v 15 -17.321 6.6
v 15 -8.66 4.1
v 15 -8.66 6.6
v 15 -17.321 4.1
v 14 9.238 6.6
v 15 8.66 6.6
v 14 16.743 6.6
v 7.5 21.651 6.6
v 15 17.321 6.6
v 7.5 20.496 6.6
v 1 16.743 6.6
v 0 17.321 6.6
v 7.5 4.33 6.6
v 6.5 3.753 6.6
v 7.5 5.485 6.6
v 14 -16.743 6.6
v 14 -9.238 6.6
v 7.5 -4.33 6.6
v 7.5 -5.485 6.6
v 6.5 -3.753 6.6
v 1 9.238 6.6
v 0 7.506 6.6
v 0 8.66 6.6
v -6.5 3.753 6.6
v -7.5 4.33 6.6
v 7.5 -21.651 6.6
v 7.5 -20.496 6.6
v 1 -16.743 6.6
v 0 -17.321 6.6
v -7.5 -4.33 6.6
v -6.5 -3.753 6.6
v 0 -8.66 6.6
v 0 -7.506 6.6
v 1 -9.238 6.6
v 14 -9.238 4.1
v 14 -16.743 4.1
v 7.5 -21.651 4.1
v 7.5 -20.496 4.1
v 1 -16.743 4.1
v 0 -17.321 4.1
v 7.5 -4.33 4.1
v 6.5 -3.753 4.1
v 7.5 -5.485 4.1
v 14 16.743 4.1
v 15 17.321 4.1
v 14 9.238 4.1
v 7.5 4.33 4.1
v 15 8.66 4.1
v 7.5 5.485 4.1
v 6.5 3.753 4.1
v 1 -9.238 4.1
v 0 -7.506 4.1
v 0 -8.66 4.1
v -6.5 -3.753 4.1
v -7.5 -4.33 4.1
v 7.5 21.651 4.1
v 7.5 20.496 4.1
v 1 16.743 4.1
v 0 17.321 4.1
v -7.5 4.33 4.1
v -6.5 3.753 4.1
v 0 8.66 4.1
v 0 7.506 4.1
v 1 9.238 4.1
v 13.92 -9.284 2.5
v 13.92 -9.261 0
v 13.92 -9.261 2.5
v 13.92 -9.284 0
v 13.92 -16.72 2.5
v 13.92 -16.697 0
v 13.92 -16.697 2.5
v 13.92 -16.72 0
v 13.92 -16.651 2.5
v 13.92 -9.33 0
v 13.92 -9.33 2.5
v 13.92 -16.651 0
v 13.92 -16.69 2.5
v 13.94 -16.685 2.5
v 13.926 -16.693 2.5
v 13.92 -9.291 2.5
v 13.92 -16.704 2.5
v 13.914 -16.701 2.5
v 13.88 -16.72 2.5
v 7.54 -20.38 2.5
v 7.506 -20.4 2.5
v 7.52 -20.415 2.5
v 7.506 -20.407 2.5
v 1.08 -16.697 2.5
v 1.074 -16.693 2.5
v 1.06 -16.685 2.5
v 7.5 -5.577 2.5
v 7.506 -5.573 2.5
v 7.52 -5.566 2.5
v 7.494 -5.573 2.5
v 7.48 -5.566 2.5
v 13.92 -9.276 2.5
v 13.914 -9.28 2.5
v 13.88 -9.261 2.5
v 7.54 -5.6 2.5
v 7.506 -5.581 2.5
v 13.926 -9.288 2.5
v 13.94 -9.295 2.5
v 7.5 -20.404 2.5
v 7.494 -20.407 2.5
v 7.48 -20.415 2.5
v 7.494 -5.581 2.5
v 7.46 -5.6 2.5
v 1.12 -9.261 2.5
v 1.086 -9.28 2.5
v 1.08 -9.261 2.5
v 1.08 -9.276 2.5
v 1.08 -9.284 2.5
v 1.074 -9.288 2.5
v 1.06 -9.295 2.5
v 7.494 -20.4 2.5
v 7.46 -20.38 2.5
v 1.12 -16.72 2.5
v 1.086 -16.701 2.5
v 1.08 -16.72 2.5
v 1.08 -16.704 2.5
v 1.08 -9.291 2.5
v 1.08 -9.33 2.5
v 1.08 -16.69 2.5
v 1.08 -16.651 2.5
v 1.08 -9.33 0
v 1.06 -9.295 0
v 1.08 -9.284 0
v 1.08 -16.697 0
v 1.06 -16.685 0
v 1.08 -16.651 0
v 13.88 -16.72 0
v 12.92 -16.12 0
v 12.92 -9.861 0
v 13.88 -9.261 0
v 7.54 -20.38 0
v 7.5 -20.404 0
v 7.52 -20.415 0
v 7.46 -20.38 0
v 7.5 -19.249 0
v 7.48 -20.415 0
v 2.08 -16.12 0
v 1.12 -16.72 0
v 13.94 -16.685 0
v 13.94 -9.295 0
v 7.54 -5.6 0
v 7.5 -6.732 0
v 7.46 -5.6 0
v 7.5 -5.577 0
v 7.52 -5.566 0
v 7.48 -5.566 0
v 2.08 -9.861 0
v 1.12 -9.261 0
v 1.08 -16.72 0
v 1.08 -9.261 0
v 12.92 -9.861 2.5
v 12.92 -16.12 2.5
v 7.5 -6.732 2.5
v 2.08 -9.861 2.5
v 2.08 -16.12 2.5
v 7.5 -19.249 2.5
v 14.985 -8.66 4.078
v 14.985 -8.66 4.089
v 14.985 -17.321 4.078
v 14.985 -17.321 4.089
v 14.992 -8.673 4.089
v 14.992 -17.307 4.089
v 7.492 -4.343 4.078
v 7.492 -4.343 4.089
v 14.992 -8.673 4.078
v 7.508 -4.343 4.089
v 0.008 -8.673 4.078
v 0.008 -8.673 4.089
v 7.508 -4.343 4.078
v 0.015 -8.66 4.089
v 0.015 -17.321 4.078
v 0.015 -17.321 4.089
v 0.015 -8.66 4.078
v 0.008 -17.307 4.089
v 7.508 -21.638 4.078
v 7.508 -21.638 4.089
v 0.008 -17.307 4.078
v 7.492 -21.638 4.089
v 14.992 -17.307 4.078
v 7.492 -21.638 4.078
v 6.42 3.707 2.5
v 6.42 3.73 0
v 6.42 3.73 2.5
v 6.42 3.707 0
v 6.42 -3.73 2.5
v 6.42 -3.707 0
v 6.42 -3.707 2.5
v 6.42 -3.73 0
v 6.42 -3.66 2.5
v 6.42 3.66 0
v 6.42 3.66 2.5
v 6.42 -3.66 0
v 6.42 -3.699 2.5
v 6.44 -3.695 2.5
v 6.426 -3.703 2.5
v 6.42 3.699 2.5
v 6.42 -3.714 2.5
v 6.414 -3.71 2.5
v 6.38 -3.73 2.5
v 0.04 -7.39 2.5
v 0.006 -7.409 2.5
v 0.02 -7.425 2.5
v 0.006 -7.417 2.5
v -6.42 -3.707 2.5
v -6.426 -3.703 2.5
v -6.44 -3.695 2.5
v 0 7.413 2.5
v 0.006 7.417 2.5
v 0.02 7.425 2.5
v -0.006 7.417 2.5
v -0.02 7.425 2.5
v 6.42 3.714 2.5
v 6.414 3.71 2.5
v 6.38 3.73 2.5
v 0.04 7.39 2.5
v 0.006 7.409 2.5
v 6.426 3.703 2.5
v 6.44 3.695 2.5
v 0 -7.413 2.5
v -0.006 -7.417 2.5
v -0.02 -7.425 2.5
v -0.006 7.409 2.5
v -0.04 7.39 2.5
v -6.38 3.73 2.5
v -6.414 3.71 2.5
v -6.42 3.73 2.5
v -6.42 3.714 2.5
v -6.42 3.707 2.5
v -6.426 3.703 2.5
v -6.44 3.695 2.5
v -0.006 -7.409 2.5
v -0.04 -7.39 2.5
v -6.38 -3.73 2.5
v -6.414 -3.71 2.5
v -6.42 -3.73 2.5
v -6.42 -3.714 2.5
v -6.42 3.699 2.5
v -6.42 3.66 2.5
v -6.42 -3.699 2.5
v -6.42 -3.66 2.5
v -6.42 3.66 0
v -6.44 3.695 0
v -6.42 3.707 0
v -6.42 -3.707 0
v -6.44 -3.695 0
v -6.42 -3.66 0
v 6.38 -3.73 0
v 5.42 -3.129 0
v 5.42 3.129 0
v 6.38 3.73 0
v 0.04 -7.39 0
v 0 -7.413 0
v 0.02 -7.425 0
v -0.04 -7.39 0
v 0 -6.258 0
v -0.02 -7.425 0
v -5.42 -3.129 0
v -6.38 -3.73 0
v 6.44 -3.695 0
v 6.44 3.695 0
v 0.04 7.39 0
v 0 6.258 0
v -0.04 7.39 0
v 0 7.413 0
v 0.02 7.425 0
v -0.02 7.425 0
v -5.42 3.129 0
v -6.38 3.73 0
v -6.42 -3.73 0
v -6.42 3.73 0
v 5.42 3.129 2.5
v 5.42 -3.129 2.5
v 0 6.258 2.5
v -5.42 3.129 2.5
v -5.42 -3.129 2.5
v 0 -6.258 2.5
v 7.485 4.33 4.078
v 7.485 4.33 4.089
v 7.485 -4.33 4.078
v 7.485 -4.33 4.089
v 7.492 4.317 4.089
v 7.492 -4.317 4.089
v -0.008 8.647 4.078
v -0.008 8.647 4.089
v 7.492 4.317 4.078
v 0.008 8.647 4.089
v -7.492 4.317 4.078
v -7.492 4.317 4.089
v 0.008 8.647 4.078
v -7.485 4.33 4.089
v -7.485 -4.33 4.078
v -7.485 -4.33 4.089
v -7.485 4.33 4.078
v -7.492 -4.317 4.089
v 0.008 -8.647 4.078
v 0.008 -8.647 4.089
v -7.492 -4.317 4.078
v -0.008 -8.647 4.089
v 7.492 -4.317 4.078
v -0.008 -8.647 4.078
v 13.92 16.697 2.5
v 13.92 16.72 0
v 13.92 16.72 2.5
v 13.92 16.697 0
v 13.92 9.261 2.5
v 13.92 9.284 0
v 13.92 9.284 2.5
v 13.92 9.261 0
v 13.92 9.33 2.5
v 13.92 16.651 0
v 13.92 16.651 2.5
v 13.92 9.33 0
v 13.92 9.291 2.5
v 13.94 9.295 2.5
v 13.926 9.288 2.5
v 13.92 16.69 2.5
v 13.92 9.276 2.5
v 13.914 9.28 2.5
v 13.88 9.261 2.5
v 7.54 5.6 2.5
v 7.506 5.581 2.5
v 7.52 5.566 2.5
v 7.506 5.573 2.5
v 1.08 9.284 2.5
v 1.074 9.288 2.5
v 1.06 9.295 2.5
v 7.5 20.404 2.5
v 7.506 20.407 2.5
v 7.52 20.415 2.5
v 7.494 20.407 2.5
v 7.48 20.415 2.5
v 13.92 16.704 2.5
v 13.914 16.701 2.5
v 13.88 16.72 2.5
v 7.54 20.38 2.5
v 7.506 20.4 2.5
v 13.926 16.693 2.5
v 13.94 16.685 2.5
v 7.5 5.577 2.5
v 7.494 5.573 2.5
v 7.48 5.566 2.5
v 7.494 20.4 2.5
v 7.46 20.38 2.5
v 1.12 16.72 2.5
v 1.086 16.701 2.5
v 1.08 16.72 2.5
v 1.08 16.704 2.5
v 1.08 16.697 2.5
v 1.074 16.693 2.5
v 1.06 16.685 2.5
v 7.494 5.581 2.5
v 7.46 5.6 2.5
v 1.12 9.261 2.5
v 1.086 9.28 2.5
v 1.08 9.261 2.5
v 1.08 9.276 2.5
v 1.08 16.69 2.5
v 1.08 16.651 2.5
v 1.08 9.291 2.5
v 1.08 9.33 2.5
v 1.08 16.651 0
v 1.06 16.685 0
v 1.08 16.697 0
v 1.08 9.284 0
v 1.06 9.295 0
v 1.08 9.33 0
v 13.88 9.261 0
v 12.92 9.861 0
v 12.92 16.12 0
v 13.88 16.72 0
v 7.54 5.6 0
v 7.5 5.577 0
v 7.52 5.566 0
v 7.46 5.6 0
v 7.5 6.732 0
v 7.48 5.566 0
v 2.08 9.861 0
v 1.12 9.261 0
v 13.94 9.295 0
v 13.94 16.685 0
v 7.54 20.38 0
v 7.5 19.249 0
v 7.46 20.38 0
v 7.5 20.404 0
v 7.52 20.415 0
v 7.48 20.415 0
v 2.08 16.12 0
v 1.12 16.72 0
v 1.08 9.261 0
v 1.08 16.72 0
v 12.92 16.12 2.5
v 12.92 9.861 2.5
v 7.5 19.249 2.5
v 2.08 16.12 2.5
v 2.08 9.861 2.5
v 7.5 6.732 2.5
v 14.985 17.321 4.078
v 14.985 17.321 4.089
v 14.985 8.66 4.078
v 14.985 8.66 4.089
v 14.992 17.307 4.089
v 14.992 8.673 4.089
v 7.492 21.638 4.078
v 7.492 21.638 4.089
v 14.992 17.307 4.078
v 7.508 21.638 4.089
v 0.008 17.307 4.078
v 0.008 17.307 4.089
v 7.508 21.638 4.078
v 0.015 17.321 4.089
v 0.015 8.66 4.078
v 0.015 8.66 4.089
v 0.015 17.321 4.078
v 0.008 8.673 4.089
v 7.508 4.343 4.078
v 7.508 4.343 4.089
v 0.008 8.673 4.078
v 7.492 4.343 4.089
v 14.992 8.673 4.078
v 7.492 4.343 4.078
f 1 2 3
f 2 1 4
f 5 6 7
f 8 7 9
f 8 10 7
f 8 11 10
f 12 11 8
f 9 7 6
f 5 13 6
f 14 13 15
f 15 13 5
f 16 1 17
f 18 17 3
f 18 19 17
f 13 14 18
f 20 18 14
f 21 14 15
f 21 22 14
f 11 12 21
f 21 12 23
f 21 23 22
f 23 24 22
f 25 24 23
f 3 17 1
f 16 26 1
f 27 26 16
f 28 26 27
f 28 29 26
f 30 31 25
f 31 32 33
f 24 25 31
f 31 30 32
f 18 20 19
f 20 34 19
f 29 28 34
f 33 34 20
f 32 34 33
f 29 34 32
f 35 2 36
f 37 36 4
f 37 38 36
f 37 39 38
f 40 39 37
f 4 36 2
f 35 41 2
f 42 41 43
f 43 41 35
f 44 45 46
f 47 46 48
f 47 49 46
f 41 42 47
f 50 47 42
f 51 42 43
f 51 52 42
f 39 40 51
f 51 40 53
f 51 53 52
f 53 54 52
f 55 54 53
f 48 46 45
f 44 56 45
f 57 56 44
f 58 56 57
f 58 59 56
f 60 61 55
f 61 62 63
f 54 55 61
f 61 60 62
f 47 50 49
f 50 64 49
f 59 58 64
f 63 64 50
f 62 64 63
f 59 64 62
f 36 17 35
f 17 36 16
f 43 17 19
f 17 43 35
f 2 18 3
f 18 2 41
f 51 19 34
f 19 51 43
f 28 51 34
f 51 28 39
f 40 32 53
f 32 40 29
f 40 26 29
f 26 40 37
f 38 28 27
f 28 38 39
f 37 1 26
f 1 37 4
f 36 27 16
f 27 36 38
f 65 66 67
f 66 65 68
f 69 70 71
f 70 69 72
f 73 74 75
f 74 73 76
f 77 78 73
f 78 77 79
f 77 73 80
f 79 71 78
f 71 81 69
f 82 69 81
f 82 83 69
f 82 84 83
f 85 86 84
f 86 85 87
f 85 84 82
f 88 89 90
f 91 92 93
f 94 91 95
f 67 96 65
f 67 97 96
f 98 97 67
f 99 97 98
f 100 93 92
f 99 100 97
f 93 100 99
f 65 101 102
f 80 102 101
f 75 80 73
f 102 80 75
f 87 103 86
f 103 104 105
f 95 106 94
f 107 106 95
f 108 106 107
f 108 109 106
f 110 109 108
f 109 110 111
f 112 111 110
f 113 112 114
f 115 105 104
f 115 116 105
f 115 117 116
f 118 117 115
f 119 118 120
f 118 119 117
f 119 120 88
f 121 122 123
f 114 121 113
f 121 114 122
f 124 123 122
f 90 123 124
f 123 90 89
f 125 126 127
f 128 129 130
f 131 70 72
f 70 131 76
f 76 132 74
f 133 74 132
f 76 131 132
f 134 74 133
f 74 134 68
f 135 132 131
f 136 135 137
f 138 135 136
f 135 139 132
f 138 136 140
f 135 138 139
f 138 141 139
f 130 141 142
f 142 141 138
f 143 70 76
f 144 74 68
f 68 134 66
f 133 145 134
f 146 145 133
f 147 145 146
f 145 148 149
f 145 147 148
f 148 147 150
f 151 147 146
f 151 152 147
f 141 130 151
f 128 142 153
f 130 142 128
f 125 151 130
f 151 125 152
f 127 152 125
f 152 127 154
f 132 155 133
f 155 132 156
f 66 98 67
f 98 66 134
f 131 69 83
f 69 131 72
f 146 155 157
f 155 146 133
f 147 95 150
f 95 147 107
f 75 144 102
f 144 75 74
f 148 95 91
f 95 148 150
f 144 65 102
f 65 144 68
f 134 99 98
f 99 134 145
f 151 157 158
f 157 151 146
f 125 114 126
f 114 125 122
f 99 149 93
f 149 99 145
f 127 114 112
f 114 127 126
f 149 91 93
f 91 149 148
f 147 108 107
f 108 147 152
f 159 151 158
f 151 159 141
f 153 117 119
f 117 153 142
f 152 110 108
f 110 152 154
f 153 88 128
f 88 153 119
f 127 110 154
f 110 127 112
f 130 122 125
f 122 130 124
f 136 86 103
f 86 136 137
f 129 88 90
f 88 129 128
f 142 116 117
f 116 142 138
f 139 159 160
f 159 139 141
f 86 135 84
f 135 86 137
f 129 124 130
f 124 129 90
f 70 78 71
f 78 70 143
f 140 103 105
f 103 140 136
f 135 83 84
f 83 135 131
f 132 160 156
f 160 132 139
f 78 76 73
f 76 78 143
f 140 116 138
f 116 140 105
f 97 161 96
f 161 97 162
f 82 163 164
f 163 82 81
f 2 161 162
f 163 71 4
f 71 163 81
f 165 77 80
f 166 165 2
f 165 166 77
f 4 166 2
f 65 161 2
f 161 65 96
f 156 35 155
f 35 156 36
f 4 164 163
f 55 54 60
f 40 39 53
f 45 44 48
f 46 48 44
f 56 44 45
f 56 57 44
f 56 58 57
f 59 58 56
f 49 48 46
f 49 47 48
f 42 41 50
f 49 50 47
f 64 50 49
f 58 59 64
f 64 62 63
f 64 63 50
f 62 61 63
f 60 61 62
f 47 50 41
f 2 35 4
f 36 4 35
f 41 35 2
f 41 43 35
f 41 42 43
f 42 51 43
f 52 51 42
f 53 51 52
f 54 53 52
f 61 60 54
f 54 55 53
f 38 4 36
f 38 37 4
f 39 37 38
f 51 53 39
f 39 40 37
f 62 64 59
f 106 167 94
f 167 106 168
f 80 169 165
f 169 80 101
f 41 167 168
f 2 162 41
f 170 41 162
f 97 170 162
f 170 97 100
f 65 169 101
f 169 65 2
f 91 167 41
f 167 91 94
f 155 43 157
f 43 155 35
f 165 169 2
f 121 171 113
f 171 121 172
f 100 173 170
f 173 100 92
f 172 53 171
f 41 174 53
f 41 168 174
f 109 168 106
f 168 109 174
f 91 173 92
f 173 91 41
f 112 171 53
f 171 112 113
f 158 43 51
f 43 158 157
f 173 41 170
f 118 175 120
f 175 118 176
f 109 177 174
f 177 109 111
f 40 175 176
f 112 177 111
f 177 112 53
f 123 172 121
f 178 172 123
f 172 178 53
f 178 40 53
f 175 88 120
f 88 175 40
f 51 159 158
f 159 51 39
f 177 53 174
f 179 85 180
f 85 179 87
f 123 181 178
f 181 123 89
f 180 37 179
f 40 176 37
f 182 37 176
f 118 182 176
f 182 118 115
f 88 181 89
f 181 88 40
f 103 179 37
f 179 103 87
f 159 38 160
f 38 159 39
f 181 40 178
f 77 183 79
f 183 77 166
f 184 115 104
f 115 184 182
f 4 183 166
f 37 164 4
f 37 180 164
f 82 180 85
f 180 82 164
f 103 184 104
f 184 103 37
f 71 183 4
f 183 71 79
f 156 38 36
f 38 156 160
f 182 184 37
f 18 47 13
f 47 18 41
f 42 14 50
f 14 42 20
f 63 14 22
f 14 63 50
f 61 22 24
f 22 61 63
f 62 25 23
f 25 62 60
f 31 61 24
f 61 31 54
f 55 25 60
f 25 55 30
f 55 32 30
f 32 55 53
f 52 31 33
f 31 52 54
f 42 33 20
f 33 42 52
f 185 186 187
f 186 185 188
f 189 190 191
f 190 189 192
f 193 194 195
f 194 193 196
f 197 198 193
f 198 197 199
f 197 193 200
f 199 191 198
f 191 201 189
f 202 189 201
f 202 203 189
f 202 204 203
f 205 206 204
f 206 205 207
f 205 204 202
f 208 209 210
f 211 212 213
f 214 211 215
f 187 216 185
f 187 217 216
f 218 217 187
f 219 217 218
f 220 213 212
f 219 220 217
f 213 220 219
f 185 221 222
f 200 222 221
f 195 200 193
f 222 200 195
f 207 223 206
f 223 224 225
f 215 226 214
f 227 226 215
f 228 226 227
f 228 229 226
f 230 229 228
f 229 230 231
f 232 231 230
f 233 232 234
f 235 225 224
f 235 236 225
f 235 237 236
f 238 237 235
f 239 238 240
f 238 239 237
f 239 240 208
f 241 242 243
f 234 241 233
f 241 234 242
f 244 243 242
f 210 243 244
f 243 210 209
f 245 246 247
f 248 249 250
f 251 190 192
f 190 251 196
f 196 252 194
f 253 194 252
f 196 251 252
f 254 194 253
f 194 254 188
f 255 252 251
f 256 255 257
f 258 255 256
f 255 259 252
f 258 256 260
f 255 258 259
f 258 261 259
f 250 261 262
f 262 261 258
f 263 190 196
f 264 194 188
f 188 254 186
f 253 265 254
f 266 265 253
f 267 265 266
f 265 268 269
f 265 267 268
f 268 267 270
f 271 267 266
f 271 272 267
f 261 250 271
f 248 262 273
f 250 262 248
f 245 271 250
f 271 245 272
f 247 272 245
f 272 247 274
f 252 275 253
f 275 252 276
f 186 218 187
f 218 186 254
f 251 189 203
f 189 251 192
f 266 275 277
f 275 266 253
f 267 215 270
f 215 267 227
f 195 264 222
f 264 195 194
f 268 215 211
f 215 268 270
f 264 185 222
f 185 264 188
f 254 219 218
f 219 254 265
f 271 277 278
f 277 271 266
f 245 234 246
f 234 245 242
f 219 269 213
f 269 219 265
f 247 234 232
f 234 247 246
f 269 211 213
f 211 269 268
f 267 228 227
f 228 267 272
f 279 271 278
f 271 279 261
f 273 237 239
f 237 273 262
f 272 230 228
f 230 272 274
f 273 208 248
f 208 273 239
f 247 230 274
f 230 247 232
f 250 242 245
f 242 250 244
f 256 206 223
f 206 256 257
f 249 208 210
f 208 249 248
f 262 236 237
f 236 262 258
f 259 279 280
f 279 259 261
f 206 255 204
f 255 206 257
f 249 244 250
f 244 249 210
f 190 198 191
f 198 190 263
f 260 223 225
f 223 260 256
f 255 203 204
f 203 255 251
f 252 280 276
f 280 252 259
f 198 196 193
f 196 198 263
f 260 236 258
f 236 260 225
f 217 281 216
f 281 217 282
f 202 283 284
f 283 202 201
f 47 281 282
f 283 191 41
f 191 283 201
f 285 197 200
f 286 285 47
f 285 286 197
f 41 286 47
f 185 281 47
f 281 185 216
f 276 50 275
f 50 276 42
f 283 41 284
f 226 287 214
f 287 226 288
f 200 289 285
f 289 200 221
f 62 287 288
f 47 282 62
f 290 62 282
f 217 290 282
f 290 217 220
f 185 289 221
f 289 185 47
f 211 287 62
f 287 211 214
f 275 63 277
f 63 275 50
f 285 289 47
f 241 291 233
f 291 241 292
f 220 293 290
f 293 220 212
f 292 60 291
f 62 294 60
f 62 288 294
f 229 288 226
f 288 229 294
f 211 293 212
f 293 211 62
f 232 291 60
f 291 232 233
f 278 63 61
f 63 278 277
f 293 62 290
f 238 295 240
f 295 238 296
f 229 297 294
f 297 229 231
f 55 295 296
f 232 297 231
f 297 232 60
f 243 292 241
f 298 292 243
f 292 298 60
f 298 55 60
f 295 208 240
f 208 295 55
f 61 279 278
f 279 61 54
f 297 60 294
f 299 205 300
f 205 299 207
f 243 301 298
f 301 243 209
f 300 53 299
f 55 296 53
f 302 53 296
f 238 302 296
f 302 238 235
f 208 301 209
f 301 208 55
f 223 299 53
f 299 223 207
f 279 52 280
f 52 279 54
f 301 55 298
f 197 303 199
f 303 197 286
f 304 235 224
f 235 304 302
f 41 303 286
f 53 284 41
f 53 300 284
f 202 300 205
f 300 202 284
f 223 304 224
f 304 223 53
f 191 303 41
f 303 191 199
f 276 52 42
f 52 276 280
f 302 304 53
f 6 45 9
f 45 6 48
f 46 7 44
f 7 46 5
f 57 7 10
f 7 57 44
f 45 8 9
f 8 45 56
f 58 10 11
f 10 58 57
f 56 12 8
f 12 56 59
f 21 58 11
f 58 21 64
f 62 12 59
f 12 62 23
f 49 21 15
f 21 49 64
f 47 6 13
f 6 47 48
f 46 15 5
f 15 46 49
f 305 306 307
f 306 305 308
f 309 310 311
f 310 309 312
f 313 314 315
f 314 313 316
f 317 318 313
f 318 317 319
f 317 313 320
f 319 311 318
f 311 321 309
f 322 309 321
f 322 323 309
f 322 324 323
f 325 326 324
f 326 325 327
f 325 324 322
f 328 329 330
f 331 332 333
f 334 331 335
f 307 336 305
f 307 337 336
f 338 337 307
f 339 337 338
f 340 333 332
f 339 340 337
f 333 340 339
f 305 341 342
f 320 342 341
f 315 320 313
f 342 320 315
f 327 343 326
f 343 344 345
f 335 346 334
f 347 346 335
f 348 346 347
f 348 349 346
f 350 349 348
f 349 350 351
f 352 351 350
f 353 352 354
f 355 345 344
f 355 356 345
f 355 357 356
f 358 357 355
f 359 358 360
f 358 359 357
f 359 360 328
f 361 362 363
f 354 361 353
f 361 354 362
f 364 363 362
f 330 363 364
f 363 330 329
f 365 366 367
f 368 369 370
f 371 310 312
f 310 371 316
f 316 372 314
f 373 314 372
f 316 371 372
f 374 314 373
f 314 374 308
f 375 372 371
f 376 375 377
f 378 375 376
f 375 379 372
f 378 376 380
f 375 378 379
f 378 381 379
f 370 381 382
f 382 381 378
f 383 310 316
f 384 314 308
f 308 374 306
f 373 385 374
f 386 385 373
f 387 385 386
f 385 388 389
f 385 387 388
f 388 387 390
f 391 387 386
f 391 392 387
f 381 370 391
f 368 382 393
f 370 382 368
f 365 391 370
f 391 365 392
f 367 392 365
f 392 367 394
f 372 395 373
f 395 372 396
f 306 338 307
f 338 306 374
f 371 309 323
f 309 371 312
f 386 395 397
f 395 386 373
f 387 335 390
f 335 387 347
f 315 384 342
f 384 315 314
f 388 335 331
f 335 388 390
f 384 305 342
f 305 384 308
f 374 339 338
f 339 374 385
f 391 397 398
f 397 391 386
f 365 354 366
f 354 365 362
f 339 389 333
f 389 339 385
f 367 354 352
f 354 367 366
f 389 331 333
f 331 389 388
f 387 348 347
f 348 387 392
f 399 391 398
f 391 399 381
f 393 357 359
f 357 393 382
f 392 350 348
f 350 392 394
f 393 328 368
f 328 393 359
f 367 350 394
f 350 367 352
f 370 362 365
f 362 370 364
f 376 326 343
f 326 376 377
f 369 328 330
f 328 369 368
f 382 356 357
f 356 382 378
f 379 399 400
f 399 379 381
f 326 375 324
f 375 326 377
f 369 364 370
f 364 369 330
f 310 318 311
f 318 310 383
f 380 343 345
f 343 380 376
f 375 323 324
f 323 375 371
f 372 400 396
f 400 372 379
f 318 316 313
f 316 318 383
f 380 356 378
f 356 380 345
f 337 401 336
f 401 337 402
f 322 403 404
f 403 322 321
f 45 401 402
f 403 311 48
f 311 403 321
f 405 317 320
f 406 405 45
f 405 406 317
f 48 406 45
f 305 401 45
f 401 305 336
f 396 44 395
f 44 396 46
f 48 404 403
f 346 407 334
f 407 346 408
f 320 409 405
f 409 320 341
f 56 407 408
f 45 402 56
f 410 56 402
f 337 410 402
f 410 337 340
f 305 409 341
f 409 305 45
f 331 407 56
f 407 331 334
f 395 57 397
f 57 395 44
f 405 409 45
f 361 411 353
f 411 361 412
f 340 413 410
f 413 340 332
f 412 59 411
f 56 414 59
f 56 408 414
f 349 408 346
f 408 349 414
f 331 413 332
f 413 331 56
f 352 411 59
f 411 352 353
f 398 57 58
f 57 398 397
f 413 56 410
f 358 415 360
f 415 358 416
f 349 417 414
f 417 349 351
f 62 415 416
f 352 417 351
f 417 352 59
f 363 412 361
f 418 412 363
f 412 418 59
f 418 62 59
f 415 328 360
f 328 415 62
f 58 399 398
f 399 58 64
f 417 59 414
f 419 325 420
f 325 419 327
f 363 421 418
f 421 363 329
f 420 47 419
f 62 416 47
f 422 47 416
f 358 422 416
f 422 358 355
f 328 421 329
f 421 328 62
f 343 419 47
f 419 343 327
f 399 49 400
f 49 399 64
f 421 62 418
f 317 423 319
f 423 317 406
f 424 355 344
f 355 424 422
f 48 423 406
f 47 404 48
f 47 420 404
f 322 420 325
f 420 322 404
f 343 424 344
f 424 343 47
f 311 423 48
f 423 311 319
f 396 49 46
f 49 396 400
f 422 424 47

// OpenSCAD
// file: Transforms.scad
module shine(angle=10, length=10, height=10, center=true) {
    if($children != 0) {
        intersection() {
            linear_extrude(height) {
                if(center) {
                    polygon([[0,0] , [length*cos(angle/2),length*sin(angle/2)] , [length,0] , [length*cos(-angle/2),length*sin(-angle/2)]]);
                }
                else {
                    polygon([[0,0] , [length*cos(angle),length*sin(angle)] ,  [length*cos(angle/2),length*sin(angle/2)] , [length,0]]);
                }
            } 
            children(); 
        }
    }   
    else {
        linear_extrude(height) {
            if(center) {
                polygon([[0,0] , [length*cos(angle/2),length*sin(angle/2)] , [length,0] , [length*cos(-angle/2),length*sin(-angle/2)]]);
            }
            else {
                polygon([[0,0] , [length*cos(angle),length*sin(angle)] ,  [length*cos(angle/2),length*sin(angle/2)] , [length,0]]);
            }
        }
    }  
}  

    
module cut(size=[10,10,10],translation=[0,0,0]) {
    intersection() {
        children();
        translate(translation) cube(size);
    }
}
// main file
use <Transforms.scad>

hexSize = 15;
beamSize = 1;			//Thickness of the beam
beamHeight = 2.5;			//The height of either one of the upper or lower beams.
beamOuterShift = 1.6;		//How far should the outer edge point of the transition from either lower or upper section to middle section be shifted inwards?
beamShift = 1.6;			//How far should the two sections be spread apart?

beamPlay = 0.08; 			//How much room should be left between 

module lowerHex() {
	render() for(i=[0:5]) rotate([0,0, 360/6 * i]) 
		translate([hexSize/2 - beamSize*2 - beamPlay, 
			-tan(30) * (hexSize- beamSize*2 - beamPlay) * 0.5, 0]) 
		cube([beamSize, tan(30)* (hexSize - beamSize*2 - beamPlay), beamHeight]);
}

module middleHex(aligned= false) {
	if(aligned) translate([0,0, beamHeight]) middleHex();
	else 
	render() for(i=[0:5]) rotate([0,0, 360/6 *i])
		shine(length = hexSize, height= beamHeight*2, angle = 60.1)
		rotate([90,0,0]) 
		translate([0, 0, -tan(30) * hexSize * 0.5]) 
		linear_extrude(height= tan(30)* (hexSize))
			polygon([	[hexSize/2 - beamSize*2 - beamPlay, 0],
							[hexSize/2 - beamSize - beamPlay, 0],
							[hexSize/2, beamShift],
							[hexSize/2 - beamSize, beamShift]]);
}

module upperHex(aligned= false) {
	if(aligned) translate([0,0, beamHeight + beamShift]) upperHex();
	else 
	render() for(i=[0:5]) rotate([0,0, 360/6 * i]) 
		translate([hexSize/2 - beamSize + 0.0001, 
			-tan(30) * (hexSize) * 0.5, 0]) 
		cube([beamSize, tan(30)* (hexSize), beamHeight]);
}

module hexPattern(i) {
	for(x=i) {
		if(x[1] % 2 != 0)
			translate([hexSize * x[0] + hexSize/2, x[1] * hexSize * sin(60)]) children();
		else 
			translate([hexSize * x[0], x[1] * 10]) children();
	}
}

hexPattern([[0,-1], [0,0], [0,1]]) union() {
	upperHex(true);
	lowerHex();
	middleHex(true);
}
